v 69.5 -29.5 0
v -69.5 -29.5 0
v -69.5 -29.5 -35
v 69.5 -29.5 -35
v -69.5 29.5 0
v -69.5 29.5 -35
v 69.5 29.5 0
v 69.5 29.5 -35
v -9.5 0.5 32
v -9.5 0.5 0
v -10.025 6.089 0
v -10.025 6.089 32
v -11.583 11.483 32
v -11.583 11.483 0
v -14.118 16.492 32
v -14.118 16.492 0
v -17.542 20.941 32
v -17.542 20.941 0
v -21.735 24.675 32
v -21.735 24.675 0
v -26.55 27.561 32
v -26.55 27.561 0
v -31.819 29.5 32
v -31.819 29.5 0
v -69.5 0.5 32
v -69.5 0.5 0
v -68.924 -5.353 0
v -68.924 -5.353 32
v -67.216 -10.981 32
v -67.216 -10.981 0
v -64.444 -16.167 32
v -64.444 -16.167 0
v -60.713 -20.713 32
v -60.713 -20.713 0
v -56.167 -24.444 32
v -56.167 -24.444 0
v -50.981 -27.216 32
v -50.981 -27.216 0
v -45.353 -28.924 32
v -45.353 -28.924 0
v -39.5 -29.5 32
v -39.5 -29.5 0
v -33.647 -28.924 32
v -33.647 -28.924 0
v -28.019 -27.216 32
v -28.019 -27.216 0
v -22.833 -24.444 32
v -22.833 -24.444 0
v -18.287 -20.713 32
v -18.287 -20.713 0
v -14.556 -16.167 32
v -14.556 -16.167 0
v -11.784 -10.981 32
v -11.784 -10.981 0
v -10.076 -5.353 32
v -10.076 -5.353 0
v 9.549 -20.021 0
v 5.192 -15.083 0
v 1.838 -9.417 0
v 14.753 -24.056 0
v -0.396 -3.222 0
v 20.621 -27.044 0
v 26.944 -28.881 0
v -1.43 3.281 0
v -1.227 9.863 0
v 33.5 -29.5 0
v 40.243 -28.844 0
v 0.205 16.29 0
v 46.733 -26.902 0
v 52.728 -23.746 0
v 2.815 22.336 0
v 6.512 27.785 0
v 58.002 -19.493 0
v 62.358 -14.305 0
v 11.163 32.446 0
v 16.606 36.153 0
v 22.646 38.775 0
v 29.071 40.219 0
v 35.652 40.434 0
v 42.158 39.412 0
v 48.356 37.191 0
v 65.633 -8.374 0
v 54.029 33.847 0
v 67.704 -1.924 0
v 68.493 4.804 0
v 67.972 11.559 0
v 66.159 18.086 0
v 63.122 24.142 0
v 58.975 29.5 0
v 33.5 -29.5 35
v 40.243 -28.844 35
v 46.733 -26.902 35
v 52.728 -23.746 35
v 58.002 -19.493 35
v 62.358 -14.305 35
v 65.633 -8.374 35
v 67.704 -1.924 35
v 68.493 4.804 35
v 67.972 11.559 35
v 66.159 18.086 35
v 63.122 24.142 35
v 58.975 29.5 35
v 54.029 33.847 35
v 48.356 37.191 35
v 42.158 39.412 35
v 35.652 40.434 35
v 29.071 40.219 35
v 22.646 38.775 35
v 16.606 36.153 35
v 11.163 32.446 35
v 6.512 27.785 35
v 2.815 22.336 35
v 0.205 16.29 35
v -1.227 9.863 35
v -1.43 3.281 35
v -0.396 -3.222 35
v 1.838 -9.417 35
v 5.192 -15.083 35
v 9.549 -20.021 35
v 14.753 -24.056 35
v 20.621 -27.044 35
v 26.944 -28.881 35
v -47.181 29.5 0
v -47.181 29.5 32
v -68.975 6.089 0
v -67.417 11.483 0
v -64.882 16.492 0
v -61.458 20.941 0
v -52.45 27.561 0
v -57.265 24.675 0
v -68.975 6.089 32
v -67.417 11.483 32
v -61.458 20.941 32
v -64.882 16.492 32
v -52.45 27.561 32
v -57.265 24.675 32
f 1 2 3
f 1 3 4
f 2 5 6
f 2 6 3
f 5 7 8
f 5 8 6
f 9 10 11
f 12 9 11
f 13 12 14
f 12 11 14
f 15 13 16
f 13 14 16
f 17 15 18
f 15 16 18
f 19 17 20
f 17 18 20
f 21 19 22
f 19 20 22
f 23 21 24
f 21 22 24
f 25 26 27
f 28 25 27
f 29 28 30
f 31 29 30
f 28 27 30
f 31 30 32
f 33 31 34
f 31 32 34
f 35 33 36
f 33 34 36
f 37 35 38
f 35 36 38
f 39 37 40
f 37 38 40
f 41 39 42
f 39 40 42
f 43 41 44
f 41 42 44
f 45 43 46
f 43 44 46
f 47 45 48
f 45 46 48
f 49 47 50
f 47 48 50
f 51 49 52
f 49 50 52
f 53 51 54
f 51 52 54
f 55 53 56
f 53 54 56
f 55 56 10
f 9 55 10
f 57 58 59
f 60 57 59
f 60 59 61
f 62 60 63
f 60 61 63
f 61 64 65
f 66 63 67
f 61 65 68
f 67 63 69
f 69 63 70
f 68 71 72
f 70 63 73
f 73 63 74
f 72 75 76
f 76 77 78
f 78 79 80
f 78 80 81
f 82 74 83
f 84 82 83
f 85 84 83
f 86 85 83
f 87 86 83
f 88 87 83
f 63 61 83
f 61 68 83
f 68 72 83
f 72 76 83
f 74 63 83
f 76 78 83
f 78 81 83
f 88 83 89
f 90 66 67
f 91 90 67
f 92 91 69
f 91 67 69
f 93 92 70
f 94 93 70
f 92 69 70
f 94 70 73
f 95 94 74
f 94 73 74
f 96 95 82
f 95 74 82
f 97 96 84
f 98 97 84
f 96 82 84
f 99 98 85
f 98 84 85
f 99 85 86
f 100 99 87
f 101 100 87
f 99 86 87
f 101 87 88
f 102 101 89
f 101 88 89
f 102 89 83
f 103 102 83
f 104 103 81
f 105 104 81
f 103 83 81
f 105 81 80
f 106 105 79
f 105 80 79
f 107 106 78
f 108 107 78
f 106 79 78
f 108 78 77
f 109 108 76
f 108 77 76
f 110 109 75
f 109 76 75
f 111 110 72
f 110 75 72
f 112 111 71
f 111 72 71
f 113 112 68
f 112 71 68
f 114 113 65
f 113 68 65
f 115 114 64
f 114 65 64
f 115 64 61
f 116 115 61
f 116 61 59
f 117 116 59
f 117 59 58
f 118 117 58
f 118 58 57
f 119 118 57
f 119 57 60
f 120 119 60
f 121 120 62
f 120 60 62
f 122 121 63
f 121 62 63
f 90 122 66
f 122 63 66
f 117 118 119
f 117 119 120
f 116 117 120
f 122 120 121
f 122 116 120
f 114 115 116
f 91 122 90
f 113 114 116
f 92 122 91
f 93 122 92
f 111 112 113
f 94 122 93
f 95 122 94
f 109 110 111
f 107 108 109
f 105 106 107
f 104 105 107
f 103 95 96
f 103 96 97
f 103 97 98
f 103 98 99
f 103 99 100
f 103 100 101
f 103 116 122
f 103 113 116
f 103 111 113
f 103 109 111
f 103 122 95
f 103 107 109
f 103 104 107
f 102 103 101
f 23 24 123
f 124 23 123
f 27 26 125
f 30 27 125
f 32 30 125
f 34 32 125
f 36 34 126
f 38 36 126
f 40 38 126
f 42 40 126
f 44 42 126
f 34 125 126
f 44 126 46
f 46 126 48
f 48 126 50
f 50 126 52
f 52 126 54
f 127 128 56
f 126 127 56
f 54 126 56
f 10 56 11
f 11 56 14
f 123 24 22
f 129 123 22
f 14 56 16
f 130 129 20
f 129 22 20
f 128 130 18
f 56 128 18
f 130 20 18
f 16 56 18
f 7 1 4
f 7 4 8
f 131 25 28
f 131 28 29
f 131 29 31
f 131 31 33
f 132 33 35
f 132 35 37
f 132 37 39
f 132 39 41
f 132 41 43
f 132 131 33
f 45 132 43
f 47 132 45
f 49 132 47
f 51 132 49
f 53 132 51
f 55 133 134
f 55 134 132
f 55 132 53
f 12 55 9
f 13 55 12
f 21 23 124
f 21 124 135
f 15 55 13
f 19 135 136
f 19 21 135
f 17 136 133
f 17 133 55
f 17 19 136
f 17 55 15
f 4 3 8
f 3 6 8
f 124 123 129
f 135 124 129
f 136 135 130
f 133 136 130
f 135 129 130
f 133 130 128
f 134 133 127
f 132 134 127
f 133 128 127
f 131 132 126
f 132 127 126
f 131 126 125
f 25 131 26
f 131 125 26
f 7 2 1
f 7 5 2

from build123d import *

# Parameters (mm, degrees)
F1_DEPTH = 35
F2_DEPTH = 32
F3_DEPTH = 35


with BuildPart() as f1:
    # F0 (on Top) → F1 (new body)
    with BuildSketch(Plane.XY):
        with BuildLine():
            ThreePointArc((8.0245215943, 29.5), (1.3674619739, -8.3744369255), (33.5, -29.5))
            ThreePointArc((33.5, -29.5), (58.2487373415, -19.2487373415), (68.5, 5.5))
            ThreePointArc((68.5, 5.5), (66.0318439702, 18.4104270998), (58.9754784057, 29.5))
            Line((58.9754784057, 29.5), (8.0245215943, 29.5))
        make_face()
        with BuildLine():
            ThreePointArc((58.9754784057, 29.5), (33.5, 40.5), (8.0245215943, 29.5))
            Line((8.0245215943, 29.5), (58.9754784057, 29.5))
        make_face()
    extrude(amount=F1_DEPTH)


with BuildPart() as f2:
    # F0 (on Top) → F2 (new body)
    with BuildSketch(Plane.XY):
        with BuildLine():
            ThreePointArc((-69.5, 0.5), (-60.7132034356, -20.7132034356), (-39.5, -29.5))
            ThreePointArc((-39.5, -29.5), (-18.2867965644, -20.7132034356), (-9.5, 0.5))
            ThreePointArc((-9.5, 0.5), (-15.7257032445, 18.7970711804), (-31.8188542521, 29.5))
            Line((-31.8188542521, 29.5), (-47.1811457479, 29.5))
            ThreePointArc((-47.1811457479, 29.5), (-63.2742967555, 18.7970711804), (-69.5, 0.5))
        make_face()
    extrude(amount=F2_DEPTH)


with BuildPart() as f3:
    # F0 (on Top) → F3 (new body)
    with BuildSketch(Plane.XY):
        with BuildLine():
            Line((-69.5, -29.5), (-39.5, -29.5))
            ThreePointArc((-39.5, -29.5), (-60.7132034356, -20.7132034356), (-69.5, 0.5))
            Line((-69.5, 0.5), (-69.5, -29.5))
        make_face()
        with BuildLine():
            Line((-69.5, 29.5), (-69.5, 0.5))
            ThreePointArc((-69.5, 0.5), (-63.2742967555, 18.7970711804), (-47.1811457479, 29.5))
            Line((-47.1811457479, 29.5), (-69.5, 29.5))
        make_face()
        with BuildLine():
            ThreePointArc((-69.5, 0.5), (-60.7132034356, -20.7132034356), (-39.5, -29.5))
            ThreePointArc((-39.5, -29.5), (-18.2867965644, -20.7132034356), (-9.5, 0.5))
            ThreePointArc((-9.5, 0.5), (-15.7257032445, 18.7970711804), (-31.8188542521, 29.5))
            Line((-31.8188542521, 29.5), (-47.1811457479, 29.5))
            ThreePointArc((-47.1811457479, 29.5), (-63.2742967555, 18.7970711804), (-69.5, 0.5))
        make_face()
        with BuildLine():
            ThreePointArc((8.0245215943, 29.5), (1.3674619739, -8.3744369255), (33.5, -29.5))
            ThreePointArc((33.5, -29.5), (58.2487373415, -19.2487373415), (68.5, 5.5))
            ThreePointArc((68.5, 5.5), (66.0318439702, 18.4104270998), (58.9754784057, 29.5))
            Line((58.9754784057, 29.5), (8.0245215943, 29.5))
        make_face()
        with BuildLine():
            Line((33.5, -29.5), (69.5, -29.5))
            Line((69.5, -29.5), (69.5, 29.5))
            Line((69.5, 29.5), (58.9754784057, 29.5))
            ThreePointArc((58.9754784057, 29.5), (66.0318439702, 18.4104270998), (68.5, 5.5))
            ThreePointArc((68.5, 5.5), (58.2487373415, -19.2487373415), (33.5, -29.5))
        make_face()
        with BuildLine():
            Line((-39.5, -29.5), (33.5, -29.5))
            ThreePointArc((33.5, -29.5), (1.3674619739, -8.3744369255), (8.0245215943, 29.5))
            Line((8.0245215943, 29.5), (-31.8188542521, 29.5))
            ThreePointArc((-31.8188542521, 29.5), (-15.7257032445, 18.7970711804), (-9.5, 0.5))
            ThreePointArc((-9.5, 0.5), (-18.2867965644, -20.7132034356), (-39.5, -29.5))
        make_face()
    extrude(amount=-F3_DEPTH)


solid = Compound([f1.part, f2.part, f3.part])
